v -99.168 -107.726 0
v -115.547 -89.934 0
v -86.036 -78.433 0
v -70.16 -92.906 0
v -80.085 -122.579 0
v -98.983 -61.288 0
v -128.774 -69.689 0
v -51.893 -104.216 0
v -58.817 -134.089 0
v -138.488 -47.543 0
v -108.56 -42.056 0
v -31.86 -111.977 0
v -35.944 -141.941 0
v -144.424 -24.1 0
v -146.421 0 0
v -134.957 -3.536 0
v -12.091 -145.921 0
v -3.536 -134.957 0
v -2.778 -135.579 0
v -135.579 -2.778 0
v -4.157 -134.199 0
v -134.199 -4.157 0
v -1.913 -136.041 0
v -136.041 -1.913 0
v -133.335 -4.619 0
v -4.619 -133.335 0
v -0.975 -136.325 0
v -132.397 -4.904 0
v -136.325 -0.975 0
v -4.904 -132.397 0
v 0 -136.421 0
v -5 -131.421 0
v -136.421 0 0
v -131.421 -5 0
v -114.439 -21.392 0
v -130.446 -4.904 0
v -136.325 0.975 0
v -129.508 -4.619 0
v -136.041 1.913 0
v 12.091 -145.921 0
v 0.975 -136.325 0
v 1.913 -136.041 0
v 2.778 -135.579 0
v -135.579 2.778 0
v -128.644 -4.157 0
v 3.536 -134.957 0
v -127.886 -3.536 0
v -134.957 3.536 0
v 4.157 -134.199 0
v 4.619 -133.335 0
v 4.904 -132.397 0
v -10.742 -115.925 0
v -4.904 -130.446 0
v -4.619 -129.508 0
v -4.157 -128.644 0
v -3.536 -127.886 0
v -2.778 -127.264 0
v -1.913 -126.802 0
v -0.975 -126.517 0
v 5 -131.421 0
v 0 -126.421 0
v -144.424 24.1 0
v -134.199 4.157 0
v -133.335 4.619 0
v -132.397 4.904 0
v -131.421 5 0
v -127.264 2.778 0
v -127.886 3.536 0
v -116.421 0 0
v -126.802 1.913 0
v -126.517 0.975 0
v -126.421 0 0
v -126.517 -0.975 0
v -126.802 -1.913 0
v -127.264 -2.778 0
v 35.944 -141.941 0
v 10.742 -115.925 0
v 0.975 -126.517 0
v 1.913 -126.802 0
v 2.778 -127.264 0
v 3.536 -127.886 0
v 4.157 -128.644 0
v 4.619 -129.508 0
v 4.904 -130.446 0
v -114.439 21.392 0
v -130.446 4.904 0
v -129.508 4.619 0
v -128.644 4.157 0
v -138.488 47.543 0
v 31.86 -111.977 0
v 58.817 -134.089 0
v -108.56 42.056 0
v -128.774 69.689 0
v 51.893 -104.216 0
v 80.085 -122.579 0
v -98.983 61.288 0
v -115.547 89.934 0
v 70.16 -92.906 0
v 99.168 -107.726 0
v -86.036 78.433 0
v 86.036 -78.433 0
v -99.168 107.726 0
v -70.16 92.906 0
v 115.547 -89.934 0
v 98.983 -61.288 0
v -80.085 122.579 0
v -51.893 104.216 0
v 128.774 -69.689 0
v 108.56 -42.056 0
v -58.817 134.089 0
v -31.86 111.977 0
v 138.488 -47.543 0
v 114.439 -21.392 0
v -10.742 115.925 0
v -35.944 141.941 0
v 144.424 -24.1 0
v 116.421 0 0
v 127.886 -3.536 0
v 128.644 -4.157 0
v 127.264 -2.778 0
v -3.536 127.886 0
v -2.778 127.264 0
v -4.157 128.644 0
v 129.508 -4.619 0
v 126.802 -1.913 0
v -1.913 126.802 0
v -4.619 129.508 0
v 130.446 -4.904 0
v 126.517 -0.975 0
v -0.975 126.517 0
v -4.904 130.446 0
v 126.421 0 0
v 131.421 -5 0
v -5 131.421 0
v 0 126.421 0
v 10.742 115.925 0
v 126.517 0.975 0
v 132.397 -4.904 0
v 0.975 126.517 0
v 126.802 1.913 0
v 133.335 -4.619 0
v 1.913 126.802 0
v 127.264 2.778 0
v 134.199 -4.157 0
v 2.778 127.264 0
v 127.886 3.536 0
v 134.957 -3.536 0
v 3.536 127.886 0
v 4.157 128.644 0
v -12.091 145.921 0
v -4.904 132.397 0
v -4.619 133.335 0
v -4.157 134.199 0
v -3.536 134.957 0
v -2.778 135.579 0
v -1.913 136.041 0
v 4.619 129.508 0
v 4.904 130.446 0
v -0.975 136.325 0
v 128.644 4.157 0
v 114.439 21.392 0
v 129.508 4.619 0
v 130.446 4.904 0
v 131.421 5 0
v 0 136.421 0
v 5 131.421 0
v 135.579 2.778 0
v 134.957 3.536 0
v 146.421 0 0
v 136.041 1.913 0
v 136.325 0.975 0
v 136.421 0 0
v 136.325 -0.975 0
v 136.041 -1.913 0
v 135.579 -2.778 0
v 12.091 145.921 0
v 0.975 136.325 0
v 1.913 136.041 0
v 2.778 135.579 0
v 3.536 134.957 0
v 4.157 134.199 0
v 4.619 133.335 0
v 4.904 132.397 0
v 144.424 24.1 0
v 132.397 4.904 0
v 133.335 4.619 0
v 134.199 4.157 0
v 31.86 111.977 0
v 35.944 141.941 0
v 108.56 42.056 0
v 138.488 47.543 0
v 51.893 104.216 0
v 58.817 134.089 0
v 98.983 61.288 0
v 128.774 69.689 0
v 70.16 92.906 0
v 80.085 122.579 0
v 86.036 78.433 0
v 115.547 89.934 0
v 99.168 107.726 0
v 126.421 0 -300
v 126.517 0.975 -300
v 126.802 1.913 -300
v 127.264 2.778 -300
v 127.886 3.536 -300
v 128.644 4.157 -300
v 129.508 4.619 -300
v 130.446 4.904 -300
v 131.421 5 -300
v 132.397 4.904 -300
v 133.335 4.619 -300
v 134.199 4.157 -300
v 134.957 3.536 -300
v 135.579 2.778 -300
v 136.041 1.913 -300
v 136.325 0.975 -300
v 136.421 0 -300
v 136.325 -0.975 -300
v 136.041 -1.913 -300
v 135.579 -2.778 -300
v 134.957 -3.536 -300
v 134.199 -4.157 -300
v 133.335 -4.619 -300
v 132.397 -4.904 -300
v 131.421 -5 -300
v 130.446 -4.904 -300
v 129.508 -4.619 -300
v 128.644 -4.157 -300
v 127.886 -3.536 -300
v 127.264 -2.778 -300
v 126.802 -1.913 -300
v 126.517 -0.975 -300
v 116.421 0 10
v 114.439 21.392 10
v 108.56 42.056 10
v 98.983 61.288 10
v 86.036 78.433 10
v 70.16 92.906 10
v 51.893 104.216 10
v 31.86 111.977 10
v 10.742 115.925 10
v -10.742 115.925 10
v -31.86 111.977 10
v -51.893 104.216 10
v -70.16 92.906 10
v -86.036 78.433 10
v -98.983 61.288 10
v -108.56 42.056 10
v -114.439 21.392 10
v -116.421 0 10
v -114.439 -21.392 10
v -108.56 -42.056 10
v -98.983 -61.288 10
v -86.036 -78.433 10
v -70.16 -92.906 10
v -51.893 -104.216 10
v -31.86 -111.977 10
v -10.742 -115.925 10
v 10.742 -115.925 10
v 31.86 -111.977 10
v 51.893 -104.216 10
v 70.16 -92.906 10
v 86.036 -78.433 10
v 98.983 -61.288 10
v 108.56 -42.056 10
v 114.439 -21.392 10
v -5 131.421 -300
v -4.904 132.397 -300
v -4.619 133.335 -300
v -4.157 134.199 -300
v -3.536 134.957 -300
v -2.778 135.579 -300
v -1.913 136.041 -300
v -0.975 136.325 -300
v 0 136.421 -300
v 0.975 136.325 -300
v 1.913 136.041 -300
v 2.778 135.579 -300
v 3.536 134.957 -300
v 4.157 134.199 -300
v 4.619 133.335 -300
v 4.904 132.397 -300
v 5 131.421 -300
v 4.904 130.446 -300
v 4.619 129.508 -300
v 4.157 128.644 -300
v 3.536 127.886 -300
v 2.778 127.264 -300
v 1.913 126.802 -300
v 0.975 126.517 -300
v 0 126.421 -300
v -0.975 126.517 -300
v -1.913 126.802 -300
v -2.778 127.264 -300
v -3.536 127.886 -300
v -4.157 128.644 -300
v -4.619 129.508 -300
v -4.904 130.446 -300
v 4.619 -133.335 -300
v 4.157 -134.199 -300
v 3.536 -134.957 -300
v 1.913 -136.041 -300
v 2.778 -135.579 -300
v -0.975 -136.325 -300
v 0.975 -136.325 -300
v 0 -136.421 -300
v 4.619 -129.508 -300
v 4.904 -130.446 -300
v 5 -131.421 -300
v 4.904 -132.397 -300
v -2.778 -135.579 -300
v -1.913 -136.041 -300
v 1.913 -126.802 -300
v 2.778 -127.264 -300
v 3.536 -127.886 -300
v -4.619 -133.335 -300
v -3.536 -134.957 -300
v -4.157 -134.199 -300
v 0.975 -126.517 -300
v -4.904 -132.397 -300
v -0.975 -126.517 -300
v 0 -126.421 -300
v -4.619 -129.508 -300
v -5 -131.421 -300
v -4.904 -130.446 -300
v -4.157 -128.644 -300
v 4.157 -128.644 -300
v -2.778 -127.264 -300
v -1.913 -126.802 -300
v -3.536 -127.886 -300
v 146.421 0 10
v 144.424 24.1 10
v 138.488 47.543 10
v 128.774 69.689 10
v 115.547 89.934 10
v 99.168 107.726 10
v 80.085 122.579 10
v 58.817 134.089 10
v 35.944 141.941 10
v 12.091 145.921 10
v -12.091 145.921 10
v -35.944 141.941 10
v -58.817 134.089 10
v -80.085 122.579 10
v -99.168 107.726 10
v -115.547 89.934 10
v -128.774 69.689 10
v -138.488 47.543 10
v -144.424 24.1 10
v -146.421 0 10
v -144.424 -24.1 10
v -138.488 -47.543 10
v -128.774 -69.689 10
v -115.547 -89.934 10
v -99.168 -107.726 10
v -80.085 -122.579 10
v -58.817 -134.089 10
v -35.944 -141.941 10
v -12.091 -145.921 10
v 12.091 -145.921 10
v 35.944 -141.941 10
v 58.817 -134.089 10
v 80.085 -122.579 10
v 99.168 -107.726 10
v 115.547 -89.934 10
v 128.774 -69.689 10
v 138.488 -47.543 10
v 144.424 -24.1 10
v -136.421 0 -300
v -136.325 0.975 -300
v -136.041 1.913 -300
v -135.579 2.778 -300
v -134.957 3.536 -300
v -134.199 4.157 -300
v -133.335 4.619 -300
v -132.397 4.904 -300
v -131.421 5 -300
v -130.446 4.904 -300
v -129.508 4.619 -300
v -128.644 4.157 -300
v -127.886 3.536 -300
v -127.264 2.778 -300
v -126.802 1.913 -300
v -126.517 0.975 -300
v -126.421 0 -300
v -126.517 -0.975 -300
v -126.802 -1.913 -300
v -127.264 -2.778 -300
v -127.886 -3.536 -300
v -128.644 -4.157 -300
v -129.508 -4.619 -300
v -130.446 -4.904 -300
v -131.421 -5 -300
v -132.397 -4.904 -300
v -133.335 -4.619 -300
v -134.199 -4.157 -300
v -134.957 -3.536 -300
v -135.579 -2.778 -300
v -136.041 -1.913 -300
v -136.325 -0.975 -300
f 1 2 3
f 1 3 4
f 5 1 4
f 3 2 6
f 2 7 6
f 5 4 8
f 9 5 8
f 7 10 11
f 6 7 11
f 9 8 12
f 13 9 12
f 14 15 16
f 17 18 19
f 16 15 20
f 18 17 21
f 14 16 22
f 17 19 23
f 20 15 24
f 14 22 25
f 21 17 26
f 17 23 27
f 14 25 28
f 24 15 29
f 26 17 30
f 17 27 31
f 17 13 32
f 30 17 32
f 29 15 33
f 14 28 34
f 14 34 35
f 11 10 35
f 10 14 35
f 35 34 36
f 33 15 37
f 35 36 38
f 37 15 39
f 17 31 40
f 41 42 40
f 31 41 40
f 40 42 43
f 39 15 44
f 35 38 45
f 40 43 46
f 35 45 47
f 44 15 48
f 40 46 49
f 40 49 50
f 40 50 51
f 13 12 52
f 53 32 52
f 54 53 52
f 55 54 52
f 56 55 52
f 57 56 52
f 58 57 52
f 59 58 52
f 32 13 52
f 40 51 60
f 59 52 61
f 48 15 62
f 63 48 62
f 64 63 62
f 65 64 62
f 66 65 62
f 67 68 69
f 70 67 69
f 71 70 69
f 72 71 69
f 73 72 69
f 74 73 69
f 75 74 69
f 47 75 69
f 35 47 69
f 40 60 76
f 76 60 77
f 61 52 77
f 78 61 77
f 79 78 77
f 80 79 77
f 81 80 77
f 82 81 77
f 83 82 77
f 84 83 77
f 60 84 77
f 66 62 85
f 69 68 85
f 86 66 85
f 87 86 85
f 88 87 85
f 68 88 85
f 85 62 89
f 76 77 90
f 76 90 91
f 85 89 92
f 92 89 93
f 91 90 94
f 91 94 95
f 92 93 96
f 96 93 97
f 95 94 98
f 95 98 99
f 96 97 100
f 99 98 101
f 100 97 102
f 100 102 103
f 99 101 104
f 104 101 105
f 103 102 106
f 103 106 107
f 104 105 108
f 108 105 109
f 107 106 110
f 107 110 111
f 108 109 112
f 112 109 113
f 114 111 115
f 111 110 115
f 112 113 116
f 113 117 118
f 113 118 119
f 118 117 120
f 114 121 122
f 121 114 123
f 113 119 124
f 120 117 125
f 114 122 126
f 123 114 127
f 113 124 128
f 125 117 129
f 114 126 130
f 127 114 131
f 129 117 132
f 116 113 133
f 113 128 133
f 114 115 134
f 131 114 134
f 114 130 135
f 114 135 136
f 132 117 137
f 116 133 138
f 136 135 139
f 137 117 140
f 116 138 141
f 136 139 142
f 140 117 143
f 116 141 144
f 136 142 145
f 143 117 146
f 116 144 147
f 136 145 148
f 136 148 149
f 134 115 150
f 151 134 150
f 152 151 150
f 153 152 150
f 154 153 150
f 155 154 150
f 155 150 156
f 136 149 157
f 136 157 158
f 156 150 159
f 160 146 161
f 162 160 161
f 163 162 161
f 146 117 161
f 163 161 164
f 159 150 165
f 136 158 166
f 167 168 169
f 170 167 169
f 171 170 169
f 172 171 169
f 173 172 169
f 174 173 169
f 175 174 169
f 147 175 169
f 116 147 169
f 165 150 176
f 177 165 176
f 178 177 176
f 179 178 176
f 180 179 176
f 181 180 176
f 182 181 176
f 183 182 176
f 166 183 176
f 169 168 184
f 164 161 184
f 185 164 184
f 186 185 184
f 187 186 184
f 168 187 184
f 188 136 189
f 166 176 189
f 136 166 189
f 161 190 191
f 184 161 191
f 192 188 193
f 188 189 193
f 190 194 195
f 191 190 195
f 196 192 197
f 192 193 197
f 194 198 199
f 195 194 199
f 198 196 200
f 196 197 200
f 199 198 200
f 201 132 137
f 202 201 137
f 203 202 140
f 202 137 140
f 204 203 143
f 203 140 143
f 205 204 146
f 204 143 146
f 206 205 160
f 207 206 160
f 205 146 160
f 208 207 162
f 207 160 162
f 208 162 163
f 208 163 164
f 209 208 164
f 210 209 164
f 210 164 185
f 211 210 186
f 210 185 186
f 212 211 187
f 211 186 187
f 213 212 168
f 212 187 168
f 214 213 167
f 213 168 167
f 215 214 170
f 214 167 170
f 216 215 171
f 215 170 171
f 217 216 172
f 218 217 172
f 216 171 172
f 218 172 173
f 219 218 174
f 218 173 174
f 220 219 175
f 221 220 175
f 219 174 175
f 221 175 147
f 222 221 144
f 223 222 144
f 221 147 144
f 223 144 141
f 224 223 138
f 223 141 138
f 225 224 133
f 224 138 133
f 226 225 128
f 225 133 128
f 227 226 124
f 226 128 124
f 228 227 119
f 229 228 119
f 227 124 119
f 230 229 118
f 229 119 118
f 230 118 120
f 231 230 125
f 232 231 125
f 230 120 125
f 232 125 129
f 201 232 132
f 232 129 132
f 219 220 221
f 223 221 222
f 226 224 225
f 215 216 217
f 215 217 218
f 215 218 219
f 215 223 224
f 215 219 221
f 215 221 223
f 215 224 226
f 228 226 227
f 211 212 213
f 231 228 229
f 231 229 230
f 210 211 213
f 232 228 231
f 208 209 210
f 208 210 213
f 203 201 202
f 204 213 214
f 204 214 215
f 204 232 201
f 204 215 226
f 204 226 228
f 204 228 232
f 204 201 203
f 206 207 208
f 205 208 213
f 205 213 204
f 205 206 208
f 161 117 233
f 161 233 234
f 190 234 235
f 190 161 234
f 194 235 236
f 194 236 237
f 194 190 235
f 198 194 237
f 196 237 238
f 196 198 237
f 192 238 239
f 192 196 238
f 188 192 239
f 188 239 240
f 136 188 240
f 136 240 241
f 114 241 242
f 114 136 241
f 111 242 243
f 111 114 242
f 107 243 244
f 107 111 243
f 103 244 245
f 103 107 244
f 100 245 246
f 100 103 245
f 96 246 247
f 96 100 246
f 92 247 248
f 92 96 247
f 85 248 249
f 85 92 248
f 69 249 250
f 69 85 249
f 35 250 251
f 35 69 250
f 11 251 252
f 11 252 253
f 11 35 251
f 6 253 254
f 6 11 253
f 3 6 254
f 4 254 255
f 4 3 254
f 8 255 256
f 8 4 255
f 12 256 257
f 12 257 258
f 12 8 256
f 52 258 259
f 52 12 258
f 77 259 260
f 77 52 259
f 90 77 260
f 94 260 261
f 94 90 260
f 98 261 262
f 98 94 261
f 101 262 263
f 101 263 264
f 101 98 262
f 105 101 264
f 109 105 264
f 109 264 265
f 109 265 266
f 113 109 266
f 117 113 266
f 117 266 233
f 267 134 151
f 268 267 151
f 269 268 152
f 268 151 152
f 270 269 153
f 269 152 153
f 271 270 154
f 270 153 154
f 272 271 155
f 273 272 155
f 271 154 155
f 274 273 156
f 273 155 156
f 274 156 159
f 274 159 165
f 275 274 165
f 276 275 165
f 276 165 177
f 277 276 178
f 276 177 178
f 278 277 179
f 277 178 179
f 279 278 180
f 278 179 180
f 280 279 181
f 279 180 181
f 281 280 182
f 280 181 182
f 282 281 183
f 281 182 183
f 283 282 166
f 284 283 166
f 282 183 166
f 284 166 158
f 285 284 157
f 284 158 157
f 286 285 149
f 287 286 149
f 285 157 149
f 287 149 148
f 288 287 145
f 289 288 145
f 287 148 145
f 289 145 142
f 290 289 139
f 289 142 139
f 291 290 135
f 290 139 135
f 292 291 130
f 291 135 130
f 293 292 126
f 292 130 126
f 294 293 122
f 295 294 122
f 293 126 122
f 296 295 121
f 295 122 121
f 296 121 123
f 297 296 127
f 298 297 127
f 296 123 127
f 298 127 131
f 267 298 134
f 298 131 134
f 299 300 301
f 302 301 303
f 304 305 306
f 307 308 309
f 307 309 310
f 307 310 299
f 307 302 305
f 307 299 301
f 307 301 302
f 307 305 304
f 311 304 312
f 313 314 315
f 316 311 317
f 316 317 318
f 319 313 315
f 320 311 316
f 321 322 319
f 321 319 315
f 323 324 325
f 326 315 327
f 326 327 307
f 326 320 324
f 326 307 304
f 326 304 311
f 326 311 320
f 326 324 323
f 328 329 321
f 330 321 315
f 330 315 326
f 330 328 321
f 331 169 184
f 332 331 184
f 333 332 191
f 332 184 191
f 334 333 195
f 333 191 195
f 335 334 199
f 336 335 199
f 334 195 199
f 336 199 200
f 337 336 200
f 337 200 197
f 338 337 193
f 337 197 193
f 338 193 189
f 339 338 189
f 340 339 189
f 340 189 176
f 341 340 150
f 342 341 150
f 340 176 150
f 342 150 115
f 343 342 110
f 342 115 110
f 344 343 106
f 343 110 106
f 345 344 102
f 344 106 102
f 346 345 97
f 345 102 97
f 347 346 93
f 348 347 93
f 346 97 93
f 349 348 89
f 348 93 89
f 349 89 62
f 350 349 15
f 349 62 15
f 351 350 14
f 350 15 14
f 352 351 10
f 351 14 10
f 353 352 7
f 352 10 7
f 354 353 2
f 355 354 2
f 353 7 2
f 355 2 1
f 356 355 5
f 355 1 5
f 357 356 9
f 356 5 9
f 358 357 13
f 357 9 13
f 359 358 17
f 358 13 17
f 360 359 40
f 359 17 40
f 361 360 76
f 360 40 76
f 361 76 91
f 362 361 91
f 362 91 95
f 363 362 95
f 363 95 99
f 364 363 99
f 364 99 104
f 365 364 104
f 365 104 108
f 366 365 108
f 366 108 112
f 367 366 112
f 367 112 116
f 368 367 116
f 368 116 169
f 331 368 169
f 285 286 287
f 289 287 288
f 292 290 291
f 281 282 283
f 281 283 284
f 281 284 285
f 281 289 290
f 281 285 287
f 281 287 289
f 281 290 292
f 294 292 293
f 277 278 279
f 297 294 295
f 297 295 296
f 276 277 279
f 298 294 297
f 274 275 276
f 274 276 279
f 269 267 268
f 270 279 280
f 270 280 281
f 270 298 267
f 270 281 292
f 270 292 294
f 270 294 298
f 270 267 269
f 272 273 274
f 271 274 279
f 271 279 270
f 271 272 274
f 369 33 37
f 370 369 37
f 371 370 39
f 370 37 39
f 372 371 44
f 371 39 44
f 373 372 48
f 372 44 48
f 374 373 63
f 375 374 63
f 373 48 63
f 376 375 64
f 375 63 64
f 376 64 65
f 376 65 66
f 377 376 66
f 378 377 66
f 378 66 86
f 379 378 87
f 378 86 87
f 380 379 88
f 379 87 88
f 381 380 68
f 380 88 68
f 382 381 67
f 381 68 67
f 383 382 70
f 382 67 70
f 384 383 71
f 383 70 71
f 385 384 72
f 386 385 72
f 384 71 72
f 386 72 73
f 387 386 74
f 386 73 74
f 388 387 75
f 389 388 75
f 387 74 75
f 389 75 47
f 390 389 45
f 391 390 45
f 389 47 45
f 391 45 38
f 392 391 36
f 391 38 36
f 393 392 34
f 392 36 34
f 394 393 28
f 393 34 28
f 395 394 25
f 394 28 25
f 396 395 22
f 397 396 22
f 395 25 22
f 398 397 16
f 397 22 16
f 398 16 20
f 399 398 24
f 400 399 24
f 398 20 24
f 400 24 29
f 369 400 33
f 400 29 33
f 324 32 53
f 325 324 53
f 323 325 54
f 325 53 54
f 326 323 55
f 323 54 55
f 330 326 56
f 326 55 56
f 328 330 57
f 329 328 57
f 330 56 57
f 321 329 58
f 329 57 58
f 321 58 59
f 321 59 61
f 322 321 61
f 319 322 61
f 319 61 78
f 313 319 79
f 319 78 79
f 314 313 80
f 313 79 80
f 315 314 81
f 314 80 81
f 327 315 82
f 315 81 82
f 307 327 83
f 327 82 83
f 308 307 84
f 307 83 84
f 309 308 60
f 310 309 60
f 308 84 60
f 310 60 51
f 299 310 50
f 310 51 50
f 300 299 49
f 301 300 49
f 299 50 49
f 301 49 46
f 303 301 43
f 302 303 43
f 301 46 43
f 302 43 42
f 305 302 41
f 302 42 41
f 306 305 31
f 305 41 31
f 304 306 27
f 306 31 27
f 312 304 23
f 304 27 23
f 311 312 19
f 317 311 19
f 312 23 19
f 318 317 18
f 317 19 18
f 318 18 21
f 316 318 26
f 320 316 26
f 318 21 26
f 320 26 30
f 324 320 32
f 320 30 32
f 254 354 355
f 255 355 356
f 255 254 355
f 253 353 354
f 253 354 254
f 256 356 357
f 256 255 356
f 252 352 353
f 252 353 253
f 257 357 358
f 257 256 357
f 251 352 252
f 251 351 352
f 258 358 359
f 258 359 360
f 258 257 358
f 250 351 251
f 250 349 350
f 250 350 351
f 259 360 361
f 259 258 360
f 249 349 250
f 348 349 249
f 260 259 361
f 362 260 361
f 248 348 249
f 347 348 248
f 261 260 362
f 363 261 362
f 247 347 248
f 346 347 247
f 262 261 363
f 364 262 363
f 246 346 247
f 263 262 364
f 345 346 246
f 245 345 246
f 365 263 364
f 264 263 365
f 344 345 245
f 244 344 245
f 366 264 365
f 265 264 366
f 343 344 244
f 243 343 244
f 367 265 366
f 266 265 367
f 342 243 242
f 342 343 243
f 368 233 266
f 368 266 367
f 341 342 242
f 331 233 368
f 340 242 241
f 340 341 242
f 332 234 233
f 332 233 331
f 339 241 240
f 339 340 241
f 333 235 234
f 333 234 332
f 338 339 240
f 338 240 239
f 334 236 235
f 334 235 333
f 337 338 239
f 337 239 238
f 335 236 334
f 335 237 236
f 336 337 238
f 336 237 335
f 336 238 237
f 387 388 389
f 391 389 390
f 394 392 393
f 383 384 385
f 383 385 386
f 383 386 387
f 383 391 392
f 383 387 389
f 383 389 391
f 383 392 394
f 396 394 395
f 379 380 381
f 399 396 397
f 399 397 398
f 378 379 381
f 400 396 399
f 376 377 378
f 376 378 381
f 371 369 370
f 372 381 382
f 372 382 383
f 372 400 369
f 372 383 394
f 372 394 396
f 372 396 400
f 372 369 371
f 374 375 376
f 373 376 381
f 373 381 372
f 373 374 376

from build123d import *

# Parameters (mm, degrees)
SKETCH2_R           = 146.421356237
SKETCH2_R_2         = 116.421356237
BOSS_EXTRUDE1_DEPTH = 10
SKETCH7_R           = 5
BOSS_EXTRUDE3_DEPTH = 300


with BuildPart() as part:
    # Sketch2 → Boss-Extrude1 (new body)
    with BuildSketch(Plane.XY):
        Circle(SKETCH2_R)
        Circle(SKETCH2_R_2, mode=Mode.SUBTRACT)
    extrude(amount=BOSS_EXTRUDE1_DEPTH)

    # Sketch7 → Boss-Extrude3 (add)
    with BuildSketch(Plane(origin=(0, 0, 0), x_dir=(-1, 0, 0), z_dir=(0, 0, -1))):
        with Locations((-131.421356237, 0)):
            Circle(SKETCH7_R)
        with Locations((0, 131.421356237)):
            Circle(SKETCH7_R)
        with Locations((131.421356237, 0)):
            Circle(SKETCH7_R)
        with Locations((0, -131.421356237)):
            Circle(SKETCH7_R)
    extrude(amount=BOSS_EXTRUDE3_DEPTH)


solid = part.part
